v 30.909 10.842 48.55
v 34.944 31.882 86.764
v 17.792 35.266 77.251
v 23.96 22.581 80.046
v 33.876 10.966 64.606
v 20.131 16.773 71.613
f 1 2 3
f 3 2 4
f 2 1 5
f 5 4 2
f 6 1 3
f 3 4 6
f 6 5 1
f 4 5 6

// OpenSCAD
// Auto-generated auxetic polyhedron
points = [
    [17.792485, 35.265860, 77.250916],
    [34.944165, 31.881784, 86.764488],
    [30.909100, 10.841928, 48.549739],
    [23.959783, 22.581157, 80.046420],
    [33.875506, 10.965567, 64.605739],
    [20.130822, 16.773409, 71.613288],
];

faces = [
    [0, 1, 2],
    [3, 1, 0],
    [4, 2, 1],
    [1, 3, 4],
    [0, 2, 5],
    [5, 3, 0],
    [2, 4, 5],
    [5, 4, 3],
];

polyhedron(points = points, faces = faces);
